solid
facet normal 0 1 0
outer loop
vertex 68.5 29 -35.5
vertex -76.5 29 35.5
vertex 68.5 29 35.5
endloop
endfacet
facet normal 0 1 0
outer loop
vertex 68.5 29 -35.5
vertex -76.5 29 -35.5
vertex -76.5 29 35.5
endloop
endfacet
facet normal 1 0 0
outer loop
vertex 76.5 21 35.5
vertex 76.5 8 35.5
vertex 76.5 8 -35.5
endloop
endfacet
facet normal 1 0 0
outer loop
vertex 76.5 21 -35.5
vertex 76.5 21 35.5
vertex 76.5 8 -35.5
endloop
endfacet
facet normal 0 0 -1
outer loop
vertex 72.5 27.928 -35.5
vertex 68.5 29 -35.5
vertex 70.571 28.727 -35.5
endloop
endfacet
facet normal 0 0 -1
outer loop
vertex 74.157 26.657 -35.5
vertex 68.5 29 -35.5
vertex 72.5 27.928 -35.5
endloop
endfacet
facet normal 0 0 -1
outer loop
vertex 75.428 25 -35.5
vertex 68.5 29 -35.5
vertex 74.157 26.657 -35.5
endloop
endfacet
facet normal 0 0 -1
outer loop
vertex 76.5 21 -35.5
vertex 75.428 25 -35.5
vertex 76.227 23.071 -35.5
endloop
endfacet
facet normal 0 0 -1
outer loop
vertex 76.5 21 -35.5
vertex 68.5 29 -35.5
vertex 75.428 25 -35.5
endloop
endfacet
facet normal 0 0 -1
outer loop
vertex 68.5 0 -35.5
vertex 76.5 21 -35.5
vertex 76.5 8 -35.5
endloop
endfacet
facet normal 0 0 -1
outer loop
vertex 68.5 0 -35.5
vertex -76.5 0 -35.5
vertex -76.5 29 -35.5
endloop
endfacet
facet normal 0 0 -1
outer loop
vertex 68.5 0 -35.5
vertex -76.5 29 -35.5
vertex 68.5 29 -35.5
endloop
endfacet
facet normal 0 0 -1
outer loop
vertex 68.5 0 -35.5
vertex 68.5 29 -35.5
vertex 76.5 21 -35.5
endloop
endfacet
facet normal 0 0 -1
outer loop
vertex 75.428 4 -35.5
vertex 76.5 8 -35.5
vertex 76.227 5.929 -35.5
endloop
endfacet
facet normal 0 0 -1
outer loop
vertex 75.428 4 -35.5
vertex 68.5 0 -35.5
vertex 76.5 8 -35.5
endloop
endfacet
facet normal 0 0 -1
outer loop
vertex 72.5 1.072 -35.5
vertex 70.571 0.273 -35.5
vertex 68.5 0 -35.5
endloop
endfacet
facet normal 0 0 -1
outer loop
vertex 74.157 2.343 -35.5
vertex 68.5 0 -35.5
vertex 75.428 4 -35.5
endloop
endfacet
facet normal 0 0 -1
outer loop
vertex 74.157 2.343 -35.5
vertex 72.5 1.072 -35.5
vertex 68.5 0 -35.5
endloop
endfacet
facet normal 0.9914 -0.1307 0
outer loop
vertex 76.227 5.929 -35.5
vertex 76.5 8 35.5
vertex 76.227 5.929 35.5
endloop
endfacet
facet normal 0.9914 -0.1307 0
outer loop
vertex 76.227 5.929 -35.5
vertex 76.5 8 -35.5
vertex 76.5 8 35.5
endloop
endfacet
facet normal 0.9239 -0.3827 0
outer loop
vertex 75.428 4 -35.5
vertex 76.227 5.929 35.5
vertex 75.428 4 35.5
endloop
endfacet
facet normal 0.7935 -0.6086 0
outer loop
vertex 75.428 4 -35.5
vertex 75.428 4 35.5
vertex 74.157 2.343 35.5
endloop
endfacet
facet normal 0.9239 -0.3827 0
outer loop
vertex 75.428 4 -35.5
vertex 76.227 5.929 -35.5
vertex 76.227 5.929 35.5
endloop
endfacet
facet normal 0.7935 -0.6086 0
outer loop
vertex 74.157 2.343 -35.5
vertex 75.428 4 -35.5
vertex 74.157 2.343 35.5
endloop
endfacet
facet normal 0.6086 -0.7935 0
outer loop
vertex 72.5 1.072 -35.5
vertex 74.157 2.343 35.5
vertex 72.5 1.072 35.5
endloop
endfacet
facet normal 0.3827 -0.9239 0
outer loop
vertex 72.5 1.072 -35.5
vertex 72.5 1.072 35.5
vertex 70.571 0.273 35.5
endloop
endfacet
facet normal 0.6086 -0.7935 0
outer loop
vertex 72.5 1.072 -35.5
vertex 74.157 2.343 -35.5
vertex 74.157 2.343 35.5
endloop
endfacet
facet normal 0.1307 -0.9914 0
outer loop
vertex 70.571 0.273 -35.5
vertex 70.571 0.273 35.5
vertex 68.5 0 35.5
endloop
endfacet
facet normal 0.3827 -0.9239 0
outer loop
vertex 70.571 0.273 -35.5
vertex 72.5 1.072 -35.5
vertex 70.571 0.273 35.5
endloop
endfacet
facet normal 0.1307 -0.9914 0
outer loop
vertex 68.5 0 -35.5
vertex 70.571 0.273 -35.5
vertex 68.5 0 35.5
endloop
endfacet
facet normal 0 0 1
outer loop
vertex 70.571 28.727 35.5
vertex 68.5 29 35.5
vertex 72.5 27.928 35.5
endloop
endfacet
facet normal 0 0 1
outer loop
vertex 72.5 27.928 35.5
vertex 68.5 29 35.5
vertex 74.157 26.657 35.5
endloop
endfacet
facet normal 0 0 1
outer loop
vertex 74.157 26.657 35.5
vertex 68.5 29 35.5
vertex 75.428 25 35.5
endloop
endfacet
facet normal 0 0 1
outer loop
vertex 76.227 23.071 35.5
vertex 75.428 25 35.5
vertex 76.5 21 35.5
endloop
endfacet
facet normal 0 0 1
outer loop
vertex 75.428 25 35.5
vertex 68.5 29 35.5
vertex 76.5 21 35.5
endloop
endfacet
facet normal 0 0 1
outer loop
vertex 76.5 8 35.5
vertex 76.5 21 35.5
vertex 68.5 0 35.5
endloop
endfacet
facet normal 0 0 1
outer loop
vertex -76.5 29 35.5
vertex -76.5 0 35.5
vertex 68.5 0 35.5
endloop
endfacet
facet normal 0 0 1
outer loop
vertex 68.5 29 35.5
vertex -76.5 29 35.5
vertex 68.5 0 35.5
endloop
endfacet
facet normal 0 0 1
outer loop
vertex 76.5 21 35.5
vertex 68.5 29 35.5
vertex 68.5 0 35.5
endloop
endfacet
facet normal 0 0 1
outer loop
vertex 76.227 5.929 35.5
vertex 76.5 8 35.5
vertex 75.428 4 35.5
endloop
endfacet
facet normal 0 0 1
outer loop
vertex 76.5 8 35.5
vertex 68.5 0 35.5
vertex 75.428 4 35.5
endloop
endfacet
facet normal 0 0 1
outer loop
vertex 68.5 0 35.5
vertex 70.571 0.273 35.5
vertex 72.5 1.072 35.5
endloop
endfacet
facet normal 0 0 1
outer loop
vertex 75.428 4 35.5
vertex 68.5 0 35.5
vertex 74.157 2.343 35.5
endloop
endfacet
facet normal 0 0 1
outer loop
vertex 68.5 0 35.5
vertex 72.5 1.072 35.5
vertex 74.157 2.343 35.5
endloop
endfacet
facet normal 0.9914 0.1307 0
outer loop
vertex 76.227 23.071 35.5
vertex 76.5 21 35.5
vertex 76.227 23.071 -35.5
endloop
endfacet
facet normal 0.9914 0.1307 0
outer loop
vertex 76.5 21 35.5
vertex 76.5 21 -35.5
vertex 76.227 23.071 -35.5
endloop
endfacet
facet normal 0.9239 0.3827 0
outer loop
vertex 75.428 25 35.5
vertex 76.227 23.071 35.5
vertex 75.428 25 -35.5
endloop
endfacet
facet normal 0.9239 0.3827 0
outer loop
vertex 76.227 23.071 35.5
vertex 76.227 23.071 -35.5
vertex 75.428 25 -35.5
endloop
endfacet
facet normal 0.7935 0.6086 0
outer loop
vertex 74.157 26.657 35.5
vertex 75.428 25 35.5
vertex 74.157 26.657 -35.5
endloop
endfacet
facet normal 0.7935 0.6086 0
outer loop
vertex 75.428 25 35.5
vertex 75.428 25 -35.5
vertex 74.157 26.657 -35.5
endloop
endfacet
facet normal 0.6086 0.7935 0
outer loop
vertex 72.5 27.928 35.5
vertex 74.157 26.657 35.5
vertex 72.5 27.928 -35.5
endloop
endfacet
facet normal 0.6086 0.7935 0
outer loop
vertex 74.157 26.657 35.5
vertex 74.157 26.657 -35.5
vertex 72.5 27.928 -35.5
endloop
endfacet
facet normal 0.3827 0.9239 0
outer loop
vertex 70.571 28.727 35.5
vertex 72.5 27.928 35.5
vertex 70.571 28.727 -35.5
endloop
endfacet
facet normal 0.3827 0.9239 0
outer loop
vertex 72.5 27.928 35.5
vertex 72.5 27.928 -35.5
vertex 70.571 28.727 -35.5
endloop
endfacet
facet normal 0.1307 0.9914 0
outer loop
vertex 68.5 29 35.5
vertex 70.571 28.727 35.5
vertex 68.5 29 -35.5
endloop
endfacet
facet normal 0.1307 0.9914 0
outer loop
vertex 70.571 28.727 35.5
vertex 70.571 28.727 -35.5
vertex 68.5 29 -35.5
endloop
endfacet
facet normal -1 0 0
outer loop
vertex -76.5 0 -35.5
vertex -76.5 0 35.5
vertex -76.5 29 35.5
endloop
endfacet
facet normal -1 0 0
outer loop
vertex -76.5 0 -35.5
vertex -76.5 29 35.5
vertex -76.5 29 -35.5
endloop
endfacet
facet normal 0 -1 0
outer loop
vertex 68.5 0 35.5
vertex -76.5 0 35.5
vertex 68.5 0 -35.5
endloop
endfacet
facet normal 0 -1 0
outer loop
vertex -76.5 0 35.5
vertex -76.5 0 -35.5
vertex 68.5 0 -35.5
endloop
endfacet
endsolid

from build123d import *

# Parameters (mm, degrees)
SKETCH_1_W      = 153
SKETCH_1_H      = 71
EXTRUDE_1_DEPTH = 29
FILLET_1_R      = 8
FILLET_2_R      = 8


with BuildPart() as part:
    # 草图1 → 凸台-拉伸1 (new body)
    with BuildSketch(Plane(origin=(0, 0, 0), x_dir=(1, 0, 0), z_dir=(0, 1, 0))):
        Rectangle(SKETCH_1_W, SKETCH_1_H)
    extrude(amount=EXTRUDE_1_DEPTH)

    # 圆角1
    fillet_1_edges = [part.edges().sort_by_distance(p)[0] for p in [
        (76.5, 29, 0),
    ]]
    fillet(fillet_1_edges, radius=FILLET_1_R)

    # 圆角2
    fillet_2_edges = [part.edges().sort_by_distance(p)[0] for p in [
        (76.5, 0, 0),
    ]]
    fillet(fillet_2_edges, radius=FILLET_2_R)


solid = part.part
